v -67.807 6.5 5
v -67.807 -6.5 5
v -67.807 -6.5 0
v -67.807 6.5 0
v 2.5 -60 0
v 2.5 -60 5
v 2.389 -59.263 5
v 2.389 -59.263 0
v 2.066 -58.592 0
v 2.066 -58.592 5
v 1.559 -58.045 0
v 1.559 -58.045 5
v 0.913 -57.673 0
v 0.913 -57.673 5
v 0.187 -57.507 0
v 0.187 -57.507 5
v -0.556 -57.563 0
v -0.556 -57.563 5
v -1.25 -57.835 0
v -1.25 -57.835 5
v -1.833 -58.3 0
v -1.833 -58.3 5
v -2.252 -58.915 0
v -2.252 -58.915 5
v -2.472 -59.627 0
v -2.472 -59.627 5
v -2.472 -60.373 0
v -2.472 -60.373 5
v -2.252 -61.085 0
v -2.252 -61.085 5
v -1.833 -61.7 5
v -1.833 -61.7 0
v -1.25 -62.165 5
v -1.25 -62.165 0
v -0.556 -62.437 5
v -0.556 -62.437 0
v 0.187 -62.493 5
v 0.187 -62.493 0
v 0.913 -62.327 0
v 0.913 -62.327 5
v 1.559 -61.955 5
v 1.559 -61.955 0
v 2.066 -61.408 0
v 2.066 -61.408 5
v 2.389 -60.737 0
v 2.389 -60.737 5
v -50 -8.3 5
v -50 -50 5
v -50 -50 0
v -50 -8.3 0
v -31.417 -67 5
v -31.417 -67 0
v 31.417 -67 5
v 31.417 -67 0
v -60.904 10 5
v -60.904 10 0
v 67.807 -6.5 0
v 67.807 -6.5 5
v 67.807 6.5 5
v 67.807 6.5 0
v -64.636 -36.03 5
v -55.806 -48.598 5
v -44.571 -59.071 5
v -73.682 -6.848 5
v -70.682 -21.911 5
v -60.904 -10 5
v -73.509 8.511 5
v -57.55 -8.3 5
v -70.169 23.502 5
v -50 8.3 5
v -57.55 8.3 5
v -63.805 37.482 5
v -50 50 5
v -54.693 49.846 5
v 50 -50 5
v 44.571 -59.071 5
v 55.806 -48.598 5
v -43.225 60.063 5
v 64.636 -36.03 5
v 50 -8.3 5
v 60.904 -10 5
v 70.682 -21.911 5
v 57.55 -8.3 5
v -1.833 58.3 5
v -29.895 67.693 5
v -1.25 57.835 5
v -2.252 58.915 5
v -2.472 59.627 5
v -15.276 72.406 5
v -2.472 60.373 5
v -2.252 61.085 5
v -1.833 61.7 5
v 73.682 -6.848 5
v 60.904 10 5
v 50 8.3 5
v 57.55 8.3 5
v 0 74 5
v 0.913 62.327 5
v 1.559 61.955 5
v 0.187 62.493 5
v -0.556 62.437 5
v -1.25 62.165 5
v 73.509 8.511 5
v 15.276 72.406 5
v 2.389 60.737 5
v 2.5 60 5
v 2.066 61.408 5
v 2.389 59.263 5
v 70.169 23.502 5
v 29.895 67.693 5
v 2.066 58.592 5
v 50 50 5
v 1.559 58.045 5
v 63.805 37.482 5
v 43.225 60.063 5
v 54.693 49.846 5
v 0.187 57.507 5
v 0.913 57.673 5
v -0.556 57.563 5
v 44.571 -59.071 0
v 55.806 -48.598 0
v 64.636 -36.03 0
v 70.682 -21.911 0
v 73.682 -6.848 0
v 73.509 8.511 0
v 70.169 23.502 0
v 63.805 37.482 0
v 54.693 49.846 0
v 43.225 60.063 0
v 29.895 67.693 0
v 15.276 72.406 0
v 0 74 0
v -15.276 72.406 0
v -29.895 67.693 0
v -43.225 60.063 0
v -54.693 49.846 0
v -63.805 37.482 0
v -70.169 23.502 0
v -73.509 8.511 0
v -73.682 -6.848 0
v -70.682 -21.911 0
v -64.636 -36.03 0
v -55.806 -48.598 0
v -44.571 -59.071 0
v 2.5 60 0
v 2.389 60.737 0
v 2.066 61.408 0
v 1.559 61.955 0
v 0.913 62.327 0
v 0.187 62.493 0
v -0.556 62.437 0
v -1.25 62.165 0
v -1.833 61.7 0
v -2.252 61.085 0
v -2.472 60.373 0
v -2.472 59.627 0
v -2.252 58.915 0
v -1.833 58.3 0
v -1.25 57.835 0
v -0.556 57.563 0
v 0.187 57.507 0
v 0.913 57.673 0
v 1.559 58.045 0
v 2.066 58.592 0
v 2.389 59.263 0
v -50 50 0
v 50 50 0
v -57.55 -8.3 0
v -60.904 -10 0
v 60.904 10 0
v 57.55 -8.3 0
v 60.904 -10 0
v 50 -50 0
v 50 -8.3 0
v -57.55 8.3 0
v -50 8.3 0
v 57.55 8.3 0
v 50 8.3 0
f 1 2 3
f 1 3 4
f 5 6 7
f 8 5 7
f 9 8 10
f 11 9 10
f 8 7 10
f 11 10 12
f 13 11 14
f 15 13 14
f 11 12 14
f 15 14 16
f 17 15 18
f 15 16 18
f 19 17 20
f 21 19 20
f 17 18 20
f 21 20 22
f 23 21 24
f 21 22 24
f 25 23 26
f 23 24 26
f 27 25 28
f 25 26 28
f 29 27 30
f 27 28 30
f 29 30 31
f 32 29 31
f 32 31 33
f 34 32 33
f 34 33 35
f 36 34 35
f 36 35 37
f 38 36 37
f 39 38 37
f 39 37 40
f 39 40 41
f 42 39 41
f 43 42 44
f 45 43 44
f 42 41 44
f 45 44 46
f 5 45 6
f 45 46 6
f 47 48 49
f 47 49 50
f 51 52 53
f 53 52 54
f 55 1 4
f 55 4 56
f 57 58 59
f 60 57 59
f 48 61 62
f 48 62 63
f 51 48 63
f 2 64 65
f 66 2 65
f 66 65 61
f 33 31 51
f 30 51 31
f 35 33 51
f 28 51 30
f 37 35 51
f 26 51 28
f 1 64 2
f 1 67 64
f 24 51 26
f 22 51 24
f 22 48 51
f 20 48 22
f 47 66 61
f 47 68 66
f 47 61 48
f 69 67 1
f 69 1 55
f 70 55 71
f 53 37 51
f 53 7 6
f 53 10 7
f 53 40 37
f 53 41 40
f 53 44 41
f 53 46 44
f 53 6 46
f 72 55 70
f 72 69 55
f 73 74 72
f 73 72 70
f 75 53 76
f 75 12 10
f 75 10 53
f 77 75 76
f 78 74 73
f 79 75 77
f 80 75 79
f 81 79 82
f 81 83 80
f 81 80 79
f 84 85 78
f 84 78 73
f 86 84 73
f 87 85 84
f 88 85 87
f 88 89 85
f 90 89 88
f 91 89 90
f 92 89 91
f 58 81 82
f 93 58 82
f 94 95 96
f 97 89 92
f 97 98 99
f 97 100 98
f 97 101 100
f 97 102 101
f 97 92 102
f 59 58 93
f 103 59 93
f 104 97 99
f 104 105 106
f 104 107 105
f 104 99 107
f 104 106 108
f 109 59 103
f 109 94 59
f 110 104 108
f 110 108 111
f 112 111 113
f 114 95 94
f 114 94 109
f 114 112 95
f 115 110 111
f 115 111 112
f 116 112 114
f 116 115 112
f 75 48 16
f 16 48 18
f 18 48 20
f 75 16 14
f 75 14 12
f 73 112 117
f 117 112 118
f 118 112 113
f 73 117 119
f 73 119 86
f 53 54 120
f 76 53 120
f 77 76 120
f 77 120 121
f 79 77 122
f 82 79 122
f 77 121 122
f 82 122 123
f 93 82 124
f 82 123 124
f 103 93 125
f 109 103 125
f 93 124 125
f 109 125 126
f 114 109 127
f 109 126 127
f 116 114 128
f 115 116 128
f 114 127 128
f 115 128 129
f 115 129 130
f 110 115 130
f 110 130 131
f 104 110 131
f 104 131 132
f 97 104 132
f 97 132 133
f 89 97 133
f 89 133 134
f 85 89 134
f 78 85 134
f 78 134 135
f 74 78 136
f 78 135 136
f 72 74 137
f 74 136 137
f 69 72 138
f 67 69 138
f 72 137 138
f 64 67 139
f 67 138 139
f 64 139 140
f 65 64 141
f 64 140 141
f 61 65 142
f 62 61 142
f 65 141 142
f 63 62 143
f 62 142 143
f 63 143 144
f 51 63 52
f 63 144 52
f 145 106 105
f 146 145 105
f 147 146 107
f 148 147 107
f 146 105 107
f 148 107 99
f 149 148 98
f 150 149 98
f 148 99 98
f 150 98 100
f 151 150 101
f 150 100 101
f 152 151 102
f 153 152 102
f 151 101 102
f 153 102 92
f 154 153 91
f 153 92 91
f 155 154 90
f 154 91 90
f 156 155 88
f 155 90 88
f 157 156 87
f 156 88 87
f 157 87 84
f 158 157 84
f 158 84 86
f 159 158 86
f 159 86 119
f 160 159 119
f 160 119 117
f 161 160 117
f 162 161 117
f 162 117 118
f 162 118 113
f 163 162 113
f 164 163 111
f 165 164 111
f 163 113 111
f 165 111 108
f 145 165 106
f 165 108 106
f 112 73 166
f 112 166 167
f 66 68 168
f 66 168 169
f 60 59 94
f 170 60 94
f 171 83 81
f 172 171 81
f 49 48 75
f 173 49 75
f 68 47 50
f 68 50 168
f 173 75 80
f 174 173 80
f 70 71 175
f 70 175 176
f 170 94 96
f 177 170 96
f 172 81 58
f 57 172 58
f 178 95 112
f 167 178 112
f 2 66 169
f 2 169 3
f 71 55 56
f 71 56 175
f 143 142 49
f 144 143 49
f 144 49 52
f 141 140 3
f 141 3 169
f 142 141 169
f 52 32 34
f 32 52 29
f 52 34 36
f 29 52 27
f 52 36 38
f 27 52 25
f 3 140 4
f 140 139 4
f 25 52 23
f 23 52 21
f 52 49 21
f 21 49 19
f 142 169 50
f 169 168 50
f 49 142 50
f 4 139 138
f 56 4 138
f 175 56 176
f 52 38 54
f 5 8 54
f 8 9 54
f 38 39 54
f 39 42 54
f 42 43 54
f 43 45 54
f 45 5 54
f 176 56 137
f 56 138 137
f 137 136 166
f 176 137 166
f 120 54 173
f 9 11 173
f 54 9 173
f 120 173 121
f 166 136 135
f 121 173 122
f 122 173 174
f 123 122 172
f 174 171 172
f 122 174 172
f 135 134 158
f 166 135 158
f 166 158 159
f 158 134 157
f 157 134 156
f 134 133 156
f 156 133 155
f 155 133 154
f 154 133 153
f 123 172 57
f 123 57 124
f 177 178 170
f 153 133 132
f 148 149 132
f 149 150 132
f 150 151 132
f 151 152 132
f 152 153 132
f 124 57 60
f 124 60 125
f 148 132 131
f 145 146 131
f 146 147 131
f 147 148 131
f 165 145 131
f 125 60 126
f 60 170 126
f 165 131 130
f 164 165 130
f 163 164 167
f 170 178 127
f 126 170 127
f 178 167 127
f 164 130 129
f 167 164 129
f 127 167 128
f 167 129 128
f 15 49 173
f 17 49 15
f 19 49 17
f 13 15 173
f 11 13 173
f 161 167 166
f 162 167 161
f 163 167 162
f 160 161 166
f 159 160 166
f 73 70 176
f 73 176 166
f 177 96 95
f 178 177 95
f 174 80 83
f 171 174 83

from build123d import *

# Parameters (mm, degrees)
CIRCLE_DEPTH       = 5
SKETCH2_W          = 100
SKETCH2_H          = 100
SQUARE_DEPTH       = 5
SKETCH3_R          = 2.5
HOLES_DEPTH        = 5
CUT_EXTRUDE3_DEPTH = 5


with BuildPart() as part:
    # Sketch1 → circle (new body)
    with BuildSketch(Plane.XY):
        with BuildLine():
            Line((-31.416556145, -67), (31.416556145, -67))
            ThreePointArc((31.416556145, -67), (0, 74), (-31.416556145, -67))
        make_face()
    extrude(amount=CIRCLE_DEPTH)

    # Sketch2 → square (cut)
    with BuildSketch(Plane.XY.offset(5)):
        Rectangle(SKETCH2_W, SKETCH2_H)
    extrude(amount=-SQUARE_DEPTH, mode=Mode.SUBTRACT)

    # Sketch3 → holes (cut)
    with BuildSketch(Plane.XY.offset(5)):
        with Locations((0, 60)):
            Circle(SKETCH3_R)
        with Locations((0, -60)):
            Circle(SKETCH3_R)
    extrude(amount=-HOLES_DEPTH, mode=Mode.SUBTRACT)

    # Sketch4 → Cut-Extrude3 (cut)
    with BuildSketch(Plane.XY.offset(5)):
        Polygon((-50, 0), (-50, -8.3), (-57.55, -8.3), (-60.903744176, -10), (-67.80719259, -6.5), (-67.80719259, 6.5), (-60.903744176, 10), (-57.55, 8.3), (-50, 8.3), align=None)
        Polygon((57.55, 8.3), (50, 8.3), (50, 0), (50, -8.3), (57.55, -8.3), (60.903744176, -10), (67.80719259, -6.5), (67.80719259, 6.5), (60.903744176, 10), align=None)
    extrude(amount=-CUT_EXTRUDE3_DEPTH, mode=Mode.SUBTRACT)


solid = part.part
